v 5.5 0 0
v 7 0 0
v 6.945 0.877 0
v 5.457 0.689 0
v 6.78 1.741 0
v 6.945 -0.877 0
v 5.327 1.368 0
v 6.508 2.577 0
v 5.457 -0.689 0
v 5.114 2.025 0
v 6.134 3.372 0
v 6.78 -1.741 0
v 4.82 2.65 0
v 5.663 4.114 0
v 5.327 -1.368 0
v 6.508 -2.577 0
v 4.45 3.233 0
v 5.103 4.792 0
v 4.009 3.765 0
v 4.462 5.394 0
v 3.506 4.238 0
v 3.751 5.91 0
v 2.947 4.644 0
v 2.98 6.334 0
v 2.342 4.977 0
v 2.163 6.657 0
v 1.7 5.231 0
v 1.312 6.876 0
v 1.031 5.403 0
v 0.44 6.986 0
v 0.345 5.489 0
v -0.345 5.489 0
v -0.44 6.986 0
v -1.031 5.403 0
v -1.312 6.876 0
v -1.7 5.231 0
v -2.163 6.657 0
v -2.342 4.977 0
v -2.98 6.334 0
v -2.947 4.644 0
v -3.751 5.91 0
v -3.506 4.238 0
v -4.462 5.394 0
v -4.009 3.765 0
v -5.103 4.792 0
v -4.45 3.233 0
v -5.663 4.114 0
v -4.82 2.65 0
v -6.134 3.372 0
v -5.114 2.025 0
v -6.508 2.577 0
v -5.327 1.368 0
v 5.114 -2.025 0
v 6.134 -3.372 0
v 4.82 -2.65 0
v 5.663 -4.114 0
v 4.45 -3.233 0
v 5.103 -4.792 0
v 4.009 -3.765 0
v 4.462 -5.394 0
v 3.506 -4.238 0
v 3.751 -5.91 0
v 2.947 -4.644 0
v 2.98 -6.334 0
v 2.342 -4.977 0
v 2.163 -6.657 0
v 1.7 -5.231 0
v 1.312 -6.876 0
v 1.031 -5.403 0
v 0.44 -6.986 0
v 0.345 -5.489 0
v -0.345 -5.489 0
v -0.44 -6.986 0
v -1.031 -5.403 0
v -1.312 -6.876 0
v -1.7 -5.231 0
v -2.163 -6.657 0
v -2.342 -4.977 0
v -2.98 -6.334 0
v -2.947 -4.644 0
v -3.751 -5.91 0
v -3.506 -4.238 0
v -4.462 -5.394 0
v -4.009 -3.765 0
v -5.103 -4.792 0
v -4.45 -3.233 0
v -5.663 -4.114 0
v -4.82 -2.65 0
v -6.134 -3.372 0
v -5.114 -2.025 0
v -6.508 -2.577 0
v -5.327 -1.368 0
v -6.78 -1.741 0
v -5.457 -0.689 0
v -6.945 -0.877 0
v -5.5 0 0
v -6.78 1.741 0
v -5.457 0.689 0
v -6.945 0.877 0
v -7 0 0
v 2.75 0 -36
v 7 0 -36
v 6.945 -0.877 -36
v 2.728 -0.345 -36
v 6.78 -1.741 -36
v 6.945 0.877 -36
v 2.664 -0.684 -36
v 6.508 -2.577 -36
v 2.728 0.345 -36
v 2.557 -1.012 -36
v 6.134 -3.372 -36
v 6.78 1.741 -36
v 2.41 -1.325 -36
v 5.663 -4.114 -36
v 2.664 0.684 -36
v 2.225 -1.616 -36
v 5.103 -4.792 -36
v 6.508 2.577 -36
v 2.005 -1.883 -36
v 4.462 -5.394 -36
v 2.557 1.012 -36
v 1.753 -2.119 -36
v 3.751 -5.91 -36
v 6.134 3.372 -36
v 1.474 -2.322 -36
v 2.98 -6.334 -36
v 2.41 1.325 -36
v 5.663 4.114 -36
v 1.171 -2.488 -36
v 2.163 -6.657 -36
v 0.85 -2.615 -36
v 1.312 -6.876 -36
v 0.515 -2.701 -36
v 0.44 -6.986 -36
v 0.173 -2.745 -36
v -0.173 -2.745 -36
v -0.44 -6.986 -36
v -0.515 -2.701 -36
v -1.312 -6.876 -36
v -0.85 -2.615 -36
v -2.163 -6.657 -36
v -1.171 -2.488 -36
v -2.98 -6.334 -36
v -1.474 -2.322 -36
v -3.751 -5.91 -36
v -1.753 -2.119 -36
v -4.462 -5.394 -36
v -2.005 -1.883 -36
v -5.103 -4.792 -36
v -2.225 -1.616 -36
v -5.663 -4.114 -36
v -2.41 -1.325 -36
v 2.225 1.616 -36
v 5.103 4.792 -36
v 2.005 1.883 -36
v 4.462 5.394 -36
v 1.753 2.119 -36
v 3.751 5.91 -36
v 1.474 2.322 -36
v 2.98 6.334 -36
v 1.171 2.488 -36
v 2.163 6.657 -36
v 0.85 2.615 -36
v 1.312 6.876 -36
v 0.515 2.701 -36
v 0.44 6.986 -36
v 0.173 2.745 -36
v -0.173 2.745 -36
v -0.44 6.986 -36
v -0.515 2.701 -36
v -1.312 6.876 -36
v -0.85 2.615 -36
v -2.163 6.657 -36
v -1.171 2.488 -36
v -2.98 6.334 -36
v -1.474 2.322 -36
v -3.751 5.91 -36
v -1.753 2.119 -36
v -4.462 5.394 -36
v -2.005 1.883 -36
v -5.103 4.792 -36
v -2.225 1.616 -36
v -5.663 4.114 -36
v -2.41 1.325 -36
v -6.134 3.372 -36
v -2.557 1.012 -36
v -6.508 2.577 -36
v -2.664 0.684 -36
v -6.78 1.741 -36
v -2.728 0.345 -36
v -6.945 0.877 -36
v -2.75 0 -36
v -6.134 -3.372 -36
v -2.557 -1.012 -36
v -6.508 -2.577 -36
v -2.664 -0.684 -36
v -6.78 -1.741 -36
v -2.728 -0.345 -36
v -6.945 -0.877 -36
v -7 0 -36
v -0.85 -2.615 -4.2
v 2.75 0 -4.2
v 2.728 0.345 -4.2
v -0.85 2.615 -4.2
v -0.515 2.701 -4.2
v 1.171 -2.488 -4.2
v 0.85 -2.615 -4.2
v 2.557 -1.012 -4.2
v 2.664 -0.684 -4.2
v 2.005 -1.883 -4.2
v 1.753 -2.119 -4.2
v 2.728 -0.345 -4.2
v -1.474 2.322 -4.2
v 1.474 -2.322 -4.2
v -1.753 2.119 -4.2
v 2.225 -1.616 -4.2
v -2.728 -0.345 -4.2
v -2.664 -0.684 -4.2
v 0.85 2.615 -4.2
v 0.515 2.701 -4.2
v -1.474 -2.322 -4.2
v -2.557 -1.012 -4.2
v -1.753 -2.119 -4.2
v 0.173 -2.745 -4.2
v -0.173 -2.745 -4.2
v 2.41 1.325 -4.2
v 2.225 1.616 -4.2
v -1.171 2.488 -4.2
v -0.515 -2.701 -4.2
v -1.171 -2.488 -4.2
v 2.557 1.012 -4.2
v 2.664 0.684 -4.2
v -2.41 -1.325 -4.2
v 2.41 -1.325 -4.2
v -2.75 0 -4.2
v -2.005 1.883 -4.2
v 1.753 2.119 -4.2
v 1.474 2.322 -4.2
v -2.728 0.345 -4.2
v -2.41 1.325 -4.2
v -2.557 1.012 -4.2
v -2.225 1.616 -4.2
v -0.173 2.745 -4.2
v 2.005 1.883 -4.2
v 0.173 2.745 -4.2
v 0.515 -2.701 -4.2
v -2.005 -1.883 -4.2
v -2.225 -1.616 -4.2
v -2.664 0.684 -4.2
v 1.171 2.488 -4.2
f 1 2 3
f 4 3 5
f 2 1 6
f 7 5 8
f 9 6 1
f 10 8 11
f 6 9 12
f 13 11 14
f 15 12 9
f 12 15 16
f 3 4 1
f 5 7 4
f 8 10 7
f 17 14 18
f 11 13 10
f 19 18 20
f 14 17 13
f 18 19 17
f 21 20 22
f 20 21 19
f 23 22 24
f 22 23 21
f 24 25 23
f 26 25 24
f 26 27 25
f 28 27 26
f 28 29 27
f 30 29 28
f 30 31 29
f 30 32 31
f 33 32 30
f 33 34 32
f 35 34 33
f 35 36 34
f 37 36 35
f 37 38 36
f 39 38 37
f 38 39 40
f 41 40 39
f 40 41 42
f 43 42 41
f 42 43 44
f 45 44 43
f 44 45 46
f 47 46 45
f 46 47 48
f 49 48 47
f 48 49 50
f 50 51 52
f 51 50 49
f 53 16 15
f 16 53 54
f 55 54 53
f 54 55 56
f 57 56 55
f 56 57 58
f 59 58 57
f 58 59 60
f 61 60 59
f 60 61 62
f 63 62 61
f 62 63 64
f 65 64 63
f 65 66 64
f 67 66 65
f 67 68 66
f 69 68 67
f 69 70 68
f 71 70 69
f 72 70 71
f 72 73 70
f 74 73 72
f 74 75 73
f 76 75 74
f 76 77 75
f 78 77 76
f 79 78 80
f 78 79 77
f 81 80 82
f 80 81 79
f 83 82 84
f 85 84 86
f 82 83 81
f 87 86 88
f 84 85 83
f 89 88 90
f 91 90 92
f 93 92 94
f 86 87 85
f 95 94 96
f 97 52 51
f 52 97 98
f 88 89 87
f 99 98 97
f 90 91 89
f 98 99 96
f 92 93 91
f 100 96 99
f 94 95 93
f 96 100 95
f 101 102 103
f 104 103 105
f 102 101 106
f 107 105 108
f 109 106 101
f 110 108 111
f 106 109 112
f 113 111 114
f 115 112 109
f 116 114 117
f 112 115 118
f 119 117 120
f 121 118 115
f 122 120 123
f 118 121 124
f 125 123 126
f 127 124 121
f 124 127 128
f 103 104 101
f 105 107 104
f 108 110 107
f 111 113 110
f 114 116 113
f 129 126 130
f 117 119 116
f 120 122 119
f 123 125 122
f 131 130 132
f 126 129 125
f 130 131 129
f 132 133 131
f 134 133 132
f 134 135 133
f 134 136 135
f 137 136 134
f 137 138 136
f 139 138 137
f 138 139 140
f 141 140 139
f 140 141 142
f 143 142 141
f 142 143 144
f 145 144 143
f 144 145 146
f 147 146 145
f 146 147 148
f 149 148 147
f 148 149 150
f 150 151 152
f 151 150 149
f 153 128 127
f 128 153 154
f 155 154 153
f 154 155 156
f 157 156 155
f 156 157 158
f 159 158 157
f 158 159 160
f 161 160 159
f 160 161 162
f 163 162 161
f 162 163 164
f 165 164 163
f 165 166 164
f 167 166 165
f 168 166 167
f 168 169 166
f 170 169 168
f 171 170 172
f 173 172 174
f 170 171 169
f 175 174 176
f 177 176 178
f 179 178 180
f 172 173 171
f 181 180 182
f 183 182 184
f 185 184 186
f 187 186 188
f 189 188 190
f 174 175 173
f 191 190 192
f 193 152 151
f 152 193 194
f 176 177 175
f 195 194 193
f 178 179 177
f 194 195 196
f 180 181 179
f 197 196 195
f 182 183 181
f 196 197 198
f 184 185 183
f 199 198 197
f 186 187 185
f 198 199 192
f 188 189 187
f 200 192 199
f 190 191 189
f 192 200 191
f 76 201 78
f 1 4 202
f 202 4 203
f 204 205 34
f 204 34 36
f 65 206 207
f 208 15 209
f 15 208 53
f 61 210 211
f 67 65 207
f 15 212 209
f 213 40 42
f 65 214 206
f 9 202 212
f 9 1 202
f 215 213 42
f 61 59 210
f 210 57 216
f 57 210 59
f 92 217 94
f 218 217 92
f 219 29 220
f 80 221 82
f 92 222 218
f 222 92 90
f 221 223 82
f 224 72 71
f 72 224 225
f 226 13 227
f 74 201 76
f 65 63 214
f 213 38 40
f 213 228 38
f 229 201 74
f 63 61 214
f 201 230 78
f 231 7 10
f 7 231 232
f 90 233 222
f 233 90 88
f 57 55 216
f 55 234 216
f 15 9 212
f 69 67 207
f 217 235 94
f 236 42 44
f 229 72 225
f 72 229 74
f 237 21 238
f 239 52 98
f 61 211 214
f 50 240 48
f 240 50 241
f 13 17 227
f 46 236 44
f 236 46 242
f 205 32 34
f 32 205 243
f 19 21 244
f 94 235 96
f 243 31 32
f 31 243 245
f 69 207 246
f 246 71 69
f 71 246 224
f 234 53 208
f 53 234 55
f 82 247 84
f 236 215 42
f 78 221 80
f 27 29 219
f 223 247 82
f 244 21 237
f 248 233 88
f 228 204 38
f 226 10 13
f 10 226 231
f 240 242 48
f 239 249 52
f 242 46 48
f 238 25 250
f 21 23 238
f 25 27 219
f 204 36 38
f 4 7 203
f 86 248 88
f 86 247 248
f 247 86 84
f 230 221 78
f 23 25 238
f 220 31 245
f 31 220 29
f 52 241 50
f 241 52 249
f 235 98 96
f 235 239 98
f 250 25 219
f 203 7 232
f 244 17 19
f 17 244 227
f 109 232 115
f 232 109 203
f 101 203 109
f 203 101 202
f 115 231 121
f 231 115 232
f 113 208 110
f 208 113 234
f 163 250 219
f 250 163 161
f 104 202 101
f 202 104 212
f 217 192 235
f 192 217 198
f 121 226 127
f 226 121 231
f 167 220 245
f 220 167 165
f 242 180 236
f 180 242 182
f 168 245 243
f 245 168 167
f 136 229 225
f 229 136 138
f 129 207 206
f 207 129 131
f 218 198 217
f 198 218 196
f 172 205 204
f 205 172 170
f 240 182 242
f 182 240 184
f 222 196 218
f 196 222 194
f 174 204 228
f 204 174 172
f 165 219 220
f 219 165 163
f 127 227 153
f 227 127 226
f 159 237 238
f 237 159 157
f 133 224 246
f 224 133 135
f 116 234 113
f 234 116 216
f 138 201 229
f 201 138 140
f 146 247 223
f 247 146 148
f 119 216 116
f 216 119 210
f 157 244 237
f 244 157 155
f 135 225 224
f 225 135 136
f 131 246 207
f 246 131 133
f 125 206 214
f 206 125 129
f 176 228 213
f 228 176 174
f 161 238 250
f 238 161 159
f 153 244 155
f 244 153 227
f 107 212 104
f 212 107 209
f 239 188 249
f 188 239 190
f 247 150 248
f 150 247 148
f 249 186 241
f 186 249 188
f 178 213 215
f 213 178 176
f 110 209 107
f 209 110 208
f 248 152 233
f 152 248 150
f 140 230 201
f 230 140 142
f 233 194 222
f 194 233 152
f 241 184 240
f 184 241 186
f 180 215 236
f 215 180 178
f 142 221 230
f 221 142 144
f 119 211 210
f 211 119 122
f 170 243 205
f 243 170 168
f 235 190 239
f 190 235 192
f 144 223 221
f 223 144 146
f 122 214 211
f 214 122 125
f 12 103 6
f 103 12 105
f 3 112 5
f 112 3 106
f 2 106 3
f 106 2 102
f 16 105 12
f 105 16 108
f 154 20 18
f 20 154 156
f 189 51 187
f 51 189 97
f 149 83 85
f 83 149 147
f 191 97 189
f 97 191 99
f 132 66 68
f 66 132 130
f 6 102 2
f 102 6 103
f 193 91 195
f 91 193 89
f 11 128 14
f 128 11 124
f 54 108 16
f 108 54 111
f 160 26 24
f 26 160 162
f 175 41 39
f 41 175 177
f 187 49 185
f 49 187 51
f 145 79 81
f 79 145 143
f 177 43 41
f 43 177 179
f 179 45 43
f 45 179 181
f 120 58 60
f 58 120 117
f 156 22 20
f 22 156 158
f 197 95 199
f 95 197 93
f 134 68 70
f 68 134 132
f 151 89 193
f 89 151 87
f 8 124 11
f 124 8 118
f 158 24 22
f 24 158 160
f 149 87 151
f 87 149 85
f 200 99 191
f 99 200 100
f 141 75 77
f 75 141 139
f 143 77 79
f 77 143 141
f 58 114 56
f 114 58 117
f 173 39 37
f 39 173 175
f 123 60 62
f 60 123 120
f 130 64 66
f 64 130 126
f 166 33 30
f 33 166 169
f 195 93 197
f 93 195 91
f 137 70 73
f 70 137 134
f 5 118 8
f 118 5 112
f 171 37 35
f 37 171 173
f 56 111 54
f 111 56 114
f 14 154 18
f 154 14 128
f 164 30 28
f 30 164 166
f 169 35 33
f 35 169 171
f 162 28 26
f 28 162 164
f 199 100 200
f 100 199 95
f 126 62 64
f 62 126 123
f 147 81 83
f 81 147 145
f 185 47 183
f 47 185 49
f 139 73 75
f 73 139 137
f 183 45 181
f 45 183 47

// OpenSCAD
$fn = 50;


difference() {
	union() {
		translate(v = [0, 0, -36.0000000000]) {
			cylinder(h = 36, r = 7.0000000000);
		}
		cylinder(h = 0, r = 10.0000000000);
	}
	union() {
		translate(v = [0, 0, 0]) {
			rotate(a = [0, 0, 0]) {
				difference() {
					union() {
						#translate(v = [0, 0, -36.0000000000]) {
							cylinder(h = 36, r = 2.2500000000);
						}
						#translate(v = [0, 0, -4.2000000000]) {
							cylinder(h = 4.2000000000, r1 = 2.7500000000, r2 = 5.5000000000);
						}
						#translate(v = [0, 0, -36.0000000000]) {
							cylinder(h = 36, r = 2.7500000000);
						}
						#translate(v = [0, 0, -36.0000000000]) {
							cylinder(h = 36, r = 2.2500000000);
						}
					}
					union();
				}
			}
		}
	}
}
